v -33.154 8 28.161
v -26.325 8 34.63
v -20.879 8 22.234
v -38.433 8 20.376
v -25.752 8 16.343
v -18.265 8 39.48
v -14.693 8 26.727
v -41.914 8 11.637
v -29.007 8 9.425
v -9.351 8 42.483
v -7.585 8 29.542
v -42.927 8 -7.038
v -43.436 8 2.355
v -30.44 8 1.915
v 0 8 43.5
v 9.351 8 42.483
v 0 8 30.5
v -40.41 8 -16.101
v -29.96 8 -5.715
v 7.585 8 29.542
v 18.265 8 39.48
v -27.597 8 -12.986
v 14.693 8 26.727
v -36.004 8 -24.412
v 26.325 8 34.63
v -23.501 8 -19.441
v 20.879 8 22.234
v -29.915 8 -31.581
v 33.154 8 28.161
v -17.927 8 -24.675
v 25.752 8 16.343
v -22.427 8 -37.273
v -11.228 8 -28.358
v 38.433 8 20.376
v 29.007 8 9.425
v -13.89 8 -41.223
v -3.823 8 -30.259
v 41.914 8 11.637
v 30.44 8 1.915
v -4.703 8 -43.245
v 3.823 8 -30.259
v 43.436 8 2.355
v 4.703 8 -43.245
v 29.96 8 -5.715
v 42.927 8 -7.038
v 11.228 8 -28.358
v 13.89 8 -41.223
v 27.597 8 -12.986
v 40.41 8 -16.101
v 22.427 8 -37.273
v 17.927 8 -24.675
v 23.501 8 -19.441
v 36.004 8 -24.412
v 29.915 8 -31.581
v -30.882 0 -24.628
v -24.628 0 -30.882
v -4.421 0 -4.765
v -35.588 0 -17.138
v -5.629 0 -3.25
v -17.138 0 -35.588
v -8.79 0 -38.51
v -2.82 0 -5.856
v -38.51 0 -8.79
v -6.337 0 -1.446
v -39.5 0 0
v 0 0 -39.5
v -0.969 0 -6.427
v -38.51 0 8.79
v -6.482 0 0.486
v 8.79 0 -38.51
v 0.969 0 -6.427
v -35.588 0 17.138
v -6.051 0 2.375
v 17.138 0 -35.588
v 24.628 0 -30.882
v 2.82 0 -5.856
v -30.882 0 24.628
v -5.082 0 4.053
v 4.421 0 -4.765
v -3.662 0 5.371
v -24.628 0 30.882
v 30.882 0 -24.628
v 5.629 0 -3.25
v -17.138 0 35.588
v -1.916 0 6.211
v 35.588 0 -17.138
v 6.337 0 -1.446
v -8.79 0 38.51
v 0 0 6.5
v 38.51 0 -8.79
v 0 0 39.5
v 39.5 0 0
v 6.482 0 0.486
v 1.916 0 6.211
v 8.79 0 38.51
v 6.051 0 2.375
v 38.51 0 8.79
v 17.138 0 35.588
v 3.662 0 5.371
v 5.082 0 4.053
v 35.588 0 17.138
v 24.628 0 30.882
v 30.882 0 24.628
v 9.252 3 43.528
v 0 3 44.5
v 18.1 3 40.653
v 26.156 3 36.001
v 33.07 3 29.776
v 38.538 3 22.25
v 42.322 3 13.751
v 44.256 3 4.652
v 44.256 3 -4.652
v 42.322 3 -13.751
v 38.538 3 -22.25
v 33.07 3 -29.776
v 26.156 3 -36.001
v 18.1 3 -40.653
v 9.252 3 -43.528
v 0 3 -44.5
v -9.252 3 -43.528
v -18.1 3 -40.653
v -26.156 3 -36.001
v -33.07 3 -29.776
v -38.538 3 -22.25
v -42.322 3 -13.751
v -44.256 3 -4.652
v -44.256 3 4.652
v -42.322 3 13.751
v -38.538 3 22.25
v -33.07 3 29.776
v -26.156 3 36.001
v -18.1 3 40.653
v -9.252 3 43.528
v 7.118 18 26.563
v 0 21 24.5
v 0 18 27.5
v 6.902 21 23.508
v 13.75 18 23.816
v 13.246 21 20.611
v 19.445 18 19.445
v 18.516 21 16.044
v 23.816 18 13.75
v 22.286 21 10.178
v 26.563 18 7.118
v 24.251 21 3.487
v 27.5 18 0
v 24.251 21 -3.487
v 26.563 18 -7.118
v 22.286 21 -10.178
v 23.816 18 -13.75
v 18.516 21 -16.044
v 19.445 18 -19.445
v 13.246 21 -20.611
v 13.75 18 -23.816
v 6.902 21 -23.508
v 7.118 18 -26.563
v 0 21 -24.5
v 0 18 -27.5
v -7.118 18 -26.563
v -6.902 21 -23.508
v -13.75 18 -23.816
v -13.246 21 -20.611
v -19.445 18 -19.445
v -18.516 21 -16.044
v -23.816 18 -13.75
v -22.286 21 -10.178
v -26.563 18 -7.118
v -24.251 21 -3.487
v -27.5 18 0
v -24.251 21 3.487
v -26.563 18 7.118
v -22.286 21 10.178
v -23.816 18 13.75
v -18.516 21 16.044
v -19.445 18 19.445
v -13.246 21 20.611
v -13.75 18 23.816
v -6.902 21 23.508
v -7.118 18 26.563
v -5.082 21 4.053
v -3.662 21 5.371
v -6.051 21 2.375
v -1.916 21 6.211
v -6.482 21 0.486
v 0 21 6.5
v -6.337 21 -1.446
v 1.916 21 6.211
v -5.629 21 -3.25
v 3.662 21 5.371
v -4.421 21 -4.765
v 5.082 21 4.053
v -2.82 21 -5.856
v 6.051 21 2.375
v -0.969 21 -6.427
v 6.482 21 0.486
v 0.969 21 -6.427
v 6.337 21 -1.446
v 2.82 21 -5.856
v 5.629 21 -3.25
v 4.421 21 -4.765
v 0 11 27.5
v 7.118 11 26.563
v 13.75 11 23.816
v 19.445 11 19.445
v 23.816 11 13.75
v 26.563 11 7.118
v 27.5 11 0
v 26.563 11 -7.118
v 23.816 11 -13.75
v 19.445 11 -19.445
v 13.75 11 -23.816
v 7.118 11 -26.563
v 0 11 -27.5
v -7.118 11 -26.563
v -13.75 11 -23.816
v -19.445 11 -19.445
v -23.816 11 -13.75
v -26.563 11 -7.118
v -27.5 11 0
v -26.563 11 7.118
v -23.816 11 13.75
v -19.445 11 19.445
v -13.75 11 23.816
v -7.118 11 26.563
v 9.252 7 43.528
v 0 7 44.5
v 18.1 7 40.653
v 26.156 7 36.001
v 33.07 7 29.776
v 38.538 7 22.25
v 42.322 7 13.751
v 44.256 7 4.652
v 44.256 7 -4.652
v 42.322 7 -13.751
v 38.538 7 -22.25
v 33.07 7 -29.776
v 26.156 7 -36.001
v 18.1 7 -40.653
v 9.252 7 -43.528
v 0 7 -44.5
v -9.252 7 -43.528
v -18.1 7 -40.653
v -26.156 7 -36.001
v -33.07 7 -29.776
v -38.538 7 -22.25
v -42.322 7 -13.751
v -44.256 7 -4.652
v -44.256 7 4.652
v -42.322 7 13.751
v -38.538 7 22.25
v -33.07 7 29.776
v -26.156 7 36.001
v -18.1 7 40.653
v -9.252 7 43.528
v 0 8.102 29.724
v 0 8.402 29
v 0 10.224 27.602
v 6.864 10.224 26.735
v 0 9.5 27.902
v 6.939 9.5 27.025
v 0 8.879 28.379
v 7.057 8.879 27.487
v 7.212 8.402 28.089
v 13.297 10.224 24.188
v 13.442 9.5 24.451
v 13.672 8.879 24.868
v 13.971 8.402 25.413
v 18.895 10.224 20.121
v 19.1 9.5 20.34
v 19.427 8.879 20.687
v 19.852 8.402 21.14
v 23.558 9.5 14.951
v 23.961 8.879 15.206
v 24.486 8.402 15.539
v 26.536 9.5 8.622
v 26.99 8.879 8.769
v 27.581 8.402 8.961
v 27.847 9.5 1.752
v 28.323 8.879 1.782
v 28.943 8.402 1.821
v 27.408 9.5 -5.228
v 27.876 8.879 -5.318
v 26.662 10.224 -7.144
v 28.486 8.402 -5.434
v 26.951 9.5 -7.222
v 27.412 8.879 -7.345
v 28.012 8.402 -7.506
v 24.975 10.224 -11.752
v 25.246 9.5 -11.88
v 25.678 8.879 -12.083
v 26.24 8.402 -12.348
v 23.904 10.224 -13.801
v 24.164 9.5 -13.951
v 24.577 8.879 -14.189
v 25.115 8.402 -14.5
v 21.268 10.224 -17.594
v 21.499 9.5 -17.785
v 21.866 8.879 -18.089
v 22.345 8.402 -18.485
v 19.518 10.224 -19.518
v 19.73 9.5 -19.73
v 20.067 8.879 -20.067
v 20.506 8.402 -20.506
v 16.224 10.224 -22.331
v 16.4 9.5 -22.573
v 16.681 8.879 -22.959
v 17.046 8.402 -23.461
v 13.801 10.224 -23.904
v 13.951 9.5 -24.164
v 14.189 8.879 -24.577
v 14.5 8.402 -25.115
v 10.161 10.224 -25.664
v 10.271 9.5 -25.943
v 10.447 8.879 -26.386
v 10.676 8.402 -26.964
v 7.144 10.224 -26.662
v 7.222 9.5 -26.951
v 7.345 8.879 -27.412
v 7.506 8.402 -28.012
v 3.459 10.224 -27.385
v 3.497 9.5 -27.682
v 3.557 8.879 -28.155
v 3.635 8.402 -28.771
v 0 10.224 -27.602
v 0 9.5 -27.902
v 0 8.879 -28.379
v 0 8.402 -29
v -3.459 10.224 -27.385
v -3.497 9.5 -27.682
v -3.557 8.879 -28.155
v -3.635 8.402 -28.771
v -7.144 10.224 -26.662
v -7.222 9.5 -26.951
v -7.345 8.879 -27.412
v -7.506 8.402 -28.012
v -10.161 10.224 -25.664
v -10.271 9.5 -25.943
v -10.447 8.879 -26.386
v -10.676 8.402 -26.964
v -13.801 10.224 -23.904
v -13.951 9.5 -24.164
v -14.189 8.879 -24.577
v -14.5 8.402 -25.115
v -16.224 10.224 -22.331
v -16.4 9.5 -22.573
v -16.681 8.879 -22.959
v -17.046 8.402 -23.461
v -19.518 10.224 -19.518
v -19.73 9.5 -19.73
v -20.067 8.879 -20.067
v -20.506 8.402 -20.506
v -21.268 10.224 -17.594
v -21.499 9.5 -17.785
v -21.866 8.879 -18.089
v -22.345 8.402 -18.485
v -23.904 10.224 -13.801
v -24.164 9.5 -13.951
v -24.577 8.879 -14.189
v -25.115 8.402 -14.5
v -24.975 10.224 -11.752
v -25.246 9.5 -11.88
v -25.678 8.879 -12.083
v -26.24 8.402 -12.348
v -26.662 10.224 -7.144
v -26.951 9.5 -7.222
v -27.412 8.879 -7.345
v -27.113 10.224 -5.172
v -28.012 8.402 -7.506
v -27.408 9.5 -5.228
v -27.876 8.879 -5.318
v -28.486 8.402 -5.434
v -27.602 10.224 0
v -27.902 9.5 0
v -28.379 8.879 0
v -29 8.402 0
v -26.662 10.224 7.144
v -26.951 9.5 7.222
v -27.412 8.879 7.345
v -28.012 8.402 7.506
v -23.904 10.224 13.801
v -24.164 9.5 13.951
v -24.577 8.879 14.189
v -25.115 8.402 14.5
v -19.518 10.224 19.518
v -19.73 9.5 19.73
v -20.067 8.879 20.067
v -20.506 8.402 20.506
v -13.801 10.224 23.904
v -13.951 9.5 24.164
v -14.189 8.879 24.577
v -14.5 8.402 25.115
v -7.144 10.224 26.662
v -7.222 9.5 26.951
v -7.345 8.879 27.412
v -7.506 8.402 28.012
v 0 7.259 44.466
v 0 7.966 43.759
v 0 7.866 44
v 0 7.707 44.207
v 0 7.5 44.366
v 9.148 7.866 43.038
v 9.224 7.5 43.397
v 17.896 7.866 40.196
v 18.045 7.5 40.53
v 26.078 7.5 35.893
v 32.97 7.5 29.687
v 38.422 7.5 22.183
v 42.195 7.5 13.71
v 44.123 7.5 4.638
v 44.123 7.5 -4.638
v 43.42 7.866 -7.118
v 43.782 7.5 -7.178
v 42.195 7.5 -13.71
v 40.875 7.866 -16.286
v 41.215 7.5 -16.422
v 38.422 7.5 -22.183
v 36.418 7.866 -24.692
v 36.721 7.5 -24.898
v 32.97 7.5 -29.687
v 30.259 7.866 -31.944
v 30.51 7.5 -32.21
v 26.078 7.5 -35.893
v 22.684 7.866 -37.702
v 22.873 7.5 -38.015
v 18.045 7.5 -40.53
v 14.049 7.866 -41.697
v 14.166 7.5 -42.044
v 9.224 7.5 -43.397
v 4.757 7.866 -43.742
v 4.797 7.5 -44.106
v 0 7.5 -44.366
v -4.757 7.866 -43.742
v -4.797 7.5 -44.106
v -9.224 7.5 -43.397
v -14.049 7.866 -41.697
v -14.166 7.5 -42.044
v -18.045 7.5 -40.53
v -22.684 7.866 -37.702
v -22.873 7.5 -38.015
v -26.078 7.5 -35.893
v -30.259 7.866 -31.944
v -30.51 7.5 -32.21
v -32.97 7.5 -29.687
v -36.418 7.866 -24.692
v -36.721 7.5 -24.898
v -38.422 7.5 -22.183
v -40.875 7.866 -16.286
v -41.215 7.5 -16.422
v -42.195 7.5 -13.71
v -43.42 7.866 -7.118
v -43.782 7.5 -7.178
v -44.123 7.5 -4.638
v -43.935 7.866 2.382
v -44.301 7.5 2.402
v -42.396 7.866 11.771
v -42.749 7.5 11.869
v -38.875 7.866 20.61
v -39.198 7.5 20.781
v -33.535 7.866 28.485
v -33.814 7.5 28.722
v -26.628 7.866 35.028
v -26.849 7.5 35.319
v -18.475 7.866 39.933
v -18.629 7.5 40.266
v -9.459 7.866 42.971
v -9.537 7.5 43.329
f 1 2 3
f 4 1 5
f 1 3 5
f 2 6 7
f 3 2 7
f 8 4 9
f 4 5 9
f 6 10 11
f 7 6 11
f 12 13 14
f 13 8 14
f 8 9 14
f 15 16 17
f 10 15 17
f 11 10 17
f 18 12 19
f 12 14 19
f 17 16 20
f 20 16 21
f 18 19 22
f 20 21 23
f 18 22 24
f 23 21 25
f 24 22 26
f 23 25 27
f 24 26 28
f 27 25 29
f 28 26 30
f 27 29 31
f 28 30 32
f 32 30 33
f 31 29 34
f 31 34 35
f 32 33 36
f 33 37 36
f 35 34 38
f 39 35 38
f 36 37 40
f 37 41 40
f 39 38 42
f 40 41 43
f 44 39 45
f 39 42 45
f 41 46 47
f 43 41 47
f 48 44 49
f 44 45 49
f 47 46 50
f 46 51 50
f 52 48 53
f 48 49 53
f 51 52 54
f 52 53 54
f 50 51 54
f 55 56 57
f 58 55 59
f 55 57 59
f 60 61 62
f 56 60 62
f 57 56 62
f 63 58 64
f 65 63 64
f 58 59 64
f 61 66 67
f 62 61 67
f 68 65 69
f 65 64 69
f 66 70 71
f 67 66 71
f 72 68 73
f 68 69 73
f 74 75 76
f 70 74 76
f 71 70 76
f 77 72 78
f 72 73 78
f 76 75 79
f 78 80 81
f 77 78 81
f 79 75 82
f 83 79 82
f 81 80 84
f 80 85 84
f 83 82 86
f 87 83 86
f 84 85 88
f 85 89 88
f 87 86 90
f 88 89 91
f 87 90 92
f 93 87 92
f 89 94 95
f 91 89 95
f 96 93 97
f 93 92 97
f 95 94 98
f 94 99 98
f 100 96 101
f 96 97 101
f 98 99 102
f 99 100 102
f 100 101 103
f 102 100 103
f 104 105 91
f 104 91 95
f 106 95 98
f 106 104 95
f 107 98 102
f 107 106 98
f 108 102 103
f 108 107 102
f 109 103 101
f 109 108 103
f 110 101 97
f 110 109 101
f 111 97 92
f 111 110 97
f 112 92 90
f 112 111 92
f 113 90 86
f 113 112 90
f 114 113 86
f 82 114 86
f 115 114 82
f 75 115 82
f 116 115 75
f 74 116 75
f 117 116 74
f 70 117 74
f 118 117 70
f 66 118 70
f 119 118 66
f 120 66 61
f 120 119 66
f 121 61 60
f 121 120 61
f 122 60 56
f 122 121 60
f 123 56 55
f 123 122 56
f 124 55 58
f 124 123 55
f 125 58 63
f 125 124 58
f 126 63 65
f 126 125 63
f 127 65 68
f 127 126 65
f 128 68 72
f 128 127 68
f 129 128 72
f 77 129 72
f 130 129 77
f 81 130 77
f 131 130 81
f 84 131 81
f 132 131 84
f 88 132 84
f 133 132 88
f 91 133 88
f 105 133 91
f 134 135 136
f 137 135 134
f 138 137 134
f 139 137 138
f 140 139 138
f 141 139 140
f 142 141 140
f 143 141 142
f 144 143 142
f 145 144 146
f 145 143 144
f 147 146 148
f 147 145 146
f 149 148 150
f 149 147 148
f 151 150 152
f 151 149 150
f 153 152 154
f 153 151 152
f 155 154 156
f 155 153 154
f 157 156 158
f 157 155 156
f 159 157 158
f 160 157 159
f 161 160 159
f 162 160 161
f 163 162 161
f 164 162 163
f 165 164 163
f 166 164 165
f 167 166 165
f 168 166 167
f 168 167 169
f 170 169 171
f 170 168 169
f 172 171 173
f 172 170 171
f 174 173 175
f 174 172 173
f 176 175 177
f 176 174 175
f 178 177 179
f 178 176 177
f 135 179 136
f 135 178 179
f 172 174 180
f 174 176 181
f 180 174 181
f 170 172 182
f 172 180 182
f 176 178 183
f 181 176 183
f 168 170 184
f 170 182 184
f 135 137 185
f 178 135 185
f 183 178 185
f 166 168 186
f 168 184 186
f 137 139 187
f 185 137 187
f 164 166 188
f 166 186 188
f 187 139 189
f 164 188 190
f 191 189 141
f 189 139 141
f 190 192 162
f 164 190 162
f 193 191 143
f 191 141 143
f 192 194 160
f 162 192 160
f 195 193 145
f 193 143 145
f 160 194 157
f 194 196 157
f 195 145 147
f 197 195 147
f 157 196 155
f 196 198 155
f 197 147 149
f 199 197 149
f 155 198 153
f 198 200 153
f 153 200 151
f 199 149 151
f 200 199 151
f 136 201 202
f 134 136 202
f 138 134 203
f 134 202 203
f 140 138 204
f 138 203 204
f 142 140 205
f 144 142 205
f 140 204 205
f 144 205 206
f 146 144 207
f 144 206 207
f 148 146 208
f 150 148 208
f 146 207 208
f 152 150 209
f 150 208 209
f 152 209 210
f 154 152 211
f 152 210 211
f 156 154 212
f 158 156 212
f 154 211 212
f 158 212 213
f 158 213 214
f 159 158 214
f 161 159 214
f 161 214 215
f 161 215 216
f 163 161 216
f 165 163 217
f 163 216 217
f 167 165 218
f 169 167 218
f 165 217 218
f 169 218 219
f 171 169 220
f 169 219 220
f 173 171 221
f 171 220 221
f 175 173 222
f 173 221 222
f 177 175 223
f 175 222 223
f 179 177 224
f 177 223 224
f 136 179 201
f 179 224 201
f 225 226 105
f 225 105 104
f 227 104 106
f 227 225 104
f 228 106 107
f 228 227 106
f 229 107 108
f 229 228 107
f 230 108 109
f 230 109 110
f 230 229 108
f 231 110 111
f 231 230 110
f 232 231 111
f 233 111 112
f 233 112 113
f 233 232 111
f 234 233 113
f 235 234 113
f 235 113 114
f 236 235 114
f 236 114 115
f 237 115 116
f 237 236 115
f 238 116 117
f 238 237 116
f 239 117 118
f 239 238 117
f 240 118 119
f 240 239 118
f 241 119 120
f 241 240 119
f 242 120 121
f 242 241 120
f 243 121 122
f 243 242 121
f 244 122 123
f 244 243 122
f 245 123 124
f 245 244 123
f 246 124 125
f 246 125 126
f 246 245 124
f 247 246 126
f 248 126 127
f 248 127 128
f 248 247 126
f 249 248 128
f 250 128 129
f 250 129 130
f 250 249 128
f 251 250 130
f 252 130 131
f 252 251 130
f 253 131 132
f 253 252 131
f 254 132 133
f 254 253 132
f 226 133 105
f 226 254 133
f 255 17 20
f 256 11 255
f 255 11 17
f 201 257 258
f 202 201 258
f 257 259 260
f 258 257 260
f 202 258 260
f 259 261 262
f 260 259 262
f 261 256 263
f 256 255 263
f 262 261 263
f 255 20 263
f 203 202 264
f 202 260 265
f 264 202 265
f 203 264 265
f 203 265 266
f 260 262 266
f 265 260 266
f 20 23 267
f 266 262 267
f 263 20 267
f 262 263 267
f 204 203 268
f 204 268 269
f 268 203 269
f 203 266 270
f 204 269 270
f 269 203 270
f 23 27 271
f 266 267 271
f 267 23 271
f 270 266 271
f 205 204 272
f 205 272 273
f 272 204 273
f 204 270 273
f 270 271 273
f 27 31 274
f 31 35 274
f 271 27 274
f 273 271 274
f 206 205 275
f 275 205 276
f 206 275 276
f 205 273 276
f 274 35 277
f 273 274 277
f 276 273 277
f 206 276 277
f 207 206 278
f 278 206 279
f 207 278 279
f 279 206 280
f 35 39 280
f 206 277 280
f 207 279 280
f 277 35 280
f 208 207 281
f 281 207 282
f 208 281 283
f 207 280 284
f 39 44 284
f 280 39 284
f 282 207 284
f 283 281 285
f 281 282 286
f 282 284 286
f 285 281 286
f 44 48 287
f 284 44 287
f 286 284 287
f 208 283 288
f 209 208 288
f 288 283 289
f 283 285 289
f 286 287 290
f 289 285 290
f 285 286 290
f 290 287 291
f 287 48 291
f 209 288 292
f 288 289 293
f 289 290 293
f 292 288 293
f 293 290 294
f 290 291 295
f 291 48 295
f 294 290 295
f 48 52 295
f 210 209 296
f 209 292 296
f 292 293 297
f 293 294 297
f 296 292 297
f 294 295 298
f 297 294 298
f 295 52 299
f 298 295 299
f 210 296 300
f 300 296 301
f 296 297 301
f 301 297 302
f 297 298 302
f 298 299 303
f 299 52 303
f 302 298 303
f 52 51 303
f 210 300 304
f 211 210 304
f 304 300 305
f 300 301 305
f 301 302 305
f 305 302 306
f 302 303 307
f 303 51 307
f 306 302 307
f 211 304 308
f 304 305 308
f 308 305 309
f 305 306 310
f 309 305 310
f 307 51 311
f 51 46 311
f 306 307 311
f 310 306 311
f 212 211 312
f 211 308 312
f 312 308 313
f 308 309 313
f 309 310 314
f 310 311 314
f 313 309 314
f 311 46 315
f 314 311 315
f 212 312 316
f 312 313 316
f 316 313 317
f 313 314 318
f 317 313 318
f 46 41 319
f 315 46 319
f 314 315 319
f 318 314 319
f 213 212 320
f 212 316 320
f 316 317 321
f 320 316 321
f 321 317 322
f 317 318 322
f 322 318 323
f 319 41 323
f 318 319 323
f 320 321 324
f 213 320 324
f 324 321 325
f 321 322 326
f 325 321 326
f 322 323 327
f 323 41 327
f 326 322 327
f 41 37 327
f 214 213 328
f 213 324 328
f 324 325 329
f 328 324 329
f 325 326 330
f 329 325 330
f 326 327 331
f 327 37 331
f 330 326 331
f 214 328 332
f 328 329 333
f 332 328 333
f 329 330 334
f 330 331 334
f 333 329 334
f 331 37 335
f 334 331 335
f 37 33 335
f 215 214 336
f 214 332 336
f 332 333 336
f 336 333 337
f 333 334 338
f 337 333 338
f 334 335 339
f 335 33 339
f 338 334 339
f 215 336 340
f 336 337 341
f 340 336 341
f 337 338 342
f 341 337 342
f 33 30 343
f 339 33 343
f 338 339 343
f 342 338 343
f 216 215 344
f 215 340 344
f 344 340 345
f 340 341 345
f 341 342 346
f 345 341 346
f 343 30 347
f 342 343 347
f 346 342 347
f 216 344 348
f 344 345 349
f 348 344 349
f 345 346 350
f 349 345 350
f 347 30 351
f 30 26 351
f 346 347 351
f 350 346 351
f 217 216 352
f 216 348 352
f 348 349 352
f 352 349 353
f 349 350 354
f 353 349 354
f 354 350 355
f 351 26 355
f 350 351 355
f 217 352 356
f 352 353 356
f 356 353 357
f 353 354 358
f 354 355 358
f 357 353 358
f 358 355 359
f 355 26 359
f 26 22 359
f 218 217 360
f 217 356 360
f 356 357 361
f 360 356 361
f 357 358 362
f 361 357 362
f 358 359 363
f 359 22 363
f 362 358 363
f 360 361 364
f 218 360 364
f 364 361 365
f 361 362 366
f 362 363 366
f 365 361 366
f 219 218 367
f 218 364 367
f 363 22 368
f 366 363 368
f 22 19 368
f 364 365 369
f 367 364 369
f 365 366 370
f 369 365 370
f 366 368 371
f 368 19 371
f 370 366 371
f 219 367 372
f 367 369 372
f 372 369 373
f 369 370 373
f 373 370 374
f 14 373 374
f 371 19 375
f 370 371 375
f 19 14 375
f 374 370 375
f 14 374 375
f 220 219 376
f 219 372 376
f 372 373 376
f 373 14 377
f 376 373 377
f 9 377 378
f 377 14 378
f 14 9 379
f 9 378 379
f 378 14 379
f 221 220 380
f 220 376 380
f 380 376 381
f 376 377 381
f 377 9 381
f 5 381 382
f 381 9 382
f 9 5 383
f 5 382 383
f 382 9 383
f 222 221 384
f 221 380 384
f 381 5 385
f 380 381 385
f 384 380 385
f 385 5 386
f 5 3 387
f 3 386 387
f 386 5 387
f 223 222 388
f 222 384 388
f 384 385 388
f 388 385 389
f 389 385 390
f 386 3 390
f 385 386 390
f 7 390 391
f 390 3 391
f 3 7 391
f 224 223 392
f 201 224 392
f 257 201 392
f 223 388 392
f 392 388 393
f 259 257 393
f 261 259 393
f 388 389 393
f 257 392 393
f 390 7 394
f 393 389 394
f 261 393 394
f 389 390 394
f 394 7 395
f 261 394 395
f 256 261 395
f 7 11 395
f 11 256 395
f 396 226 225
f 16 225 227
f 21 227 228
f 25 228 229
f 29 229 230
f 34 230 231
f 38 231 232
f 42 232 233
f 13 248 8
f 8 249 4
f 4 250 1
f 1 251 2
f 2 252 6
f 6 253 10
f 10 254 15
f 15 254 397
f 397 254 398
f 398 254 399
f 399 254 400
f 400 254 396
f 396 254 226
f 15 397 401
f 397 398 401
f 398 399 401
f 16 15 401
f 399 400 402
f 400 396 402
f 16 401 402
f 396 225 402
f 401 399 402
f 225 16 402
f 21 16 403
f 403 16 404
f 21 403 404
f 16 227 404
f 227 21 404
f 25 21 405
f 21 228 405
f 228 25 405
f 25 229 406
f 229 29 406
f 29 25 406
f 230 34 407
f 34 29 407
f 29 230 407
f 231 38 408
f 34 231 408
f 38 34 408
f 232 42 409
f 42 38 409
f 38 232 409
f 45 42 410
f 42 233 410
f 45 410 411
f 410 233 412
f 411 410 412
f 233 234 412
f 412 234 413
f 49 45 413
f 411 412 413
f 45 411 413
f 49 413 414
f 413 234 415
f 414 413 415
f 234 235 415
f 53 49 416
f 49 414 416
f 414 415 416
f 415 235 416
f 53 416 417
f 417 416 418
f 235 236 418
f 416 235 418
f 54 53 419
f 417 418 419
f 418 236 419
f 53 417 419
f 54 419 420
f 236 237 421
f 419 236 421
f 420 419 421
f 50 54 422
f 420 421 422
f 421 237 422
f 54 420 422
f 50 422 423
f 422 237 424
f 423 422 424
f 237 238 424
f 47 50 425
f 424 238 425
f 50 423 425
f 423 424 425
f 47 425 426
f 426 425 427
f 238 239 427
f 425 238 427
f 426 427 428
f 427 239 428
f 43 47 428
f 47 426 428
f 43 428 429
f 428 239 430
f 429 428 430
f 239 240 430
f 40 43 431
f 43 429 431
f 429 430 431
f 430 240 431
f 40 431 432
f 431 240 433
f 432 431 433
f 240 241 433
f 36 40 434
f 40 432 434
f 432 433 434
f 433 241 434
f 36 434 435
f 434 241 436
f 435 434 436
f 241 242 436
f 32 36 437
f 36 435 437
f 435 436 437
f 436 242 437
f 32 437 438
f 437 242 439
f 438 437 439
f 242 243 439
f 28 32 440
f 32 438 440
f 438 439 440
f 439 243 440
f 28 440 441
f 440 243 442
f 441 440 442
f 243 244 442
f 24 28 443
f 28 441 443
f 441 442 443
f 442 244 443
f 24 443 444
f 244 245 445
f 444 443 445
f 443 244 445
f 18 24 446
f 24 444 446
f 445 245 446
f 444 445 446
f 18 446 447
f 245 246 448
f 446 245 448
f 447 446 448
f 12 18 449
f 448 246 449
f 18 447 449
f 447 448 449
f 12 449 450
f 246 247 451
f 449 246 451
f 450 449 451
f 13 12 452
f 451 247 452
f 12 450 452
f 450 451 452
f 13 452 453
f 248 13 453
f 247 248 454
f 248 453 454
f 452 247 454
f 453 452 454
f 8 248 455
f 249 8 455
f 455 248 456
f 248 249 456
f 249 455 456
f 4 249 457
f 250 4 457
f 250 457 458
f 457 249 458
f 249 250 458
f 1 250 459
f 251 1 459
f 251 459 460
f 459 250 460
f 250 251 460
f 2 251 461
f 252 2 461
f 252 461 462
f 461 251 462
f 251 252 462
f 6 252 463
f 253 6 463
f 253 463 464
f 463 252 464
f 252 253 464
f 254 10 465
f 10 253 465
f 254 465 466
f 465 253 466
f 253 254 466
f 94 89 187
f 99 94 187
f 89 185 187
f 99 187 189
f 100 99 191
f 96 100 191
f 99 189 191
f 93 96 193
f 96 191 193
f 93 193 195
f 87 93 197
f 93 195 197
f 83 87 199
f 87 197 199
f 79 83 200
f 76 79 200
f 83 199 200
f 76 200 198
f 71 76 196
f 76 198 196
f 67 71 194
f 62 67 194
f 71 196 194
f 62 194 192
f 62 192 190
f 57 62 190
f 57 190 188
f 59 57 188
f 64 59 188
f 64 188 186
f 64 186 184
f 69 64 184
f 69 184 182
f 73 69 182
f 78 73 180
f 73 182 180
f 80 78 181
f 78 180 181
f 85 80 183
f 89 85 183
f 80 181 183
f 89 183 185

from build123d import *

# Parameters (mm, degrees)
F0_W     = 13
F0_H     = 21
F0_W_2   = 8
F0_H_2   = 17
F2_R     = 3
F3_R     = 1
F4_SIZE  = 3
F5_SIZE2 = 3
F5_SIZE  = 5


with BuildPart() as f1:
    # F0 (on Right) → F1 (revolve)
    with BuildSketch(Plane.YZ):
        with Locations((14.5, 17)):
            Rectangle(F0_W, F0_H)
        with Locations((4, 17)):
            Rectangle(F0_W_2, F0_H)
        with Locations((4, 36)):
            Rectangle(F0_W_2, F0_H_2)
    revolve(axis=Axis((0, 10.5, 0), (0, 1, 0)))

    # F2
    f2_edges = [f1.edges().sort_by_distance(p)[0] for p in [
        (0, 8, -27.5),
    ]]
    fillet(f2_edges, radius=F2_R)

    # F3
    f3_edges = [f1.edges().sort_by_distance(p)[0] for p in [
        (0, 8, -44.5),
    ]]
    fillet(f3_edges, radius=F3_R)

    # F4
    f4_edges = [f1.edges().sort_by_distance(p)[0] for p in [
        (0, 21, -27.5),
    ]]
    chamfer(f4_edges, length=F4_SIZE)

    # F5
    f5_edges = [f1.edges().sort_by_distance(p)[0] for p in [
        (0, 0, -44.5),
    ]]
    chamfer(f5_edges, length=F5_SIZE, length2=F5_SIZE2)


solid = f1.part
